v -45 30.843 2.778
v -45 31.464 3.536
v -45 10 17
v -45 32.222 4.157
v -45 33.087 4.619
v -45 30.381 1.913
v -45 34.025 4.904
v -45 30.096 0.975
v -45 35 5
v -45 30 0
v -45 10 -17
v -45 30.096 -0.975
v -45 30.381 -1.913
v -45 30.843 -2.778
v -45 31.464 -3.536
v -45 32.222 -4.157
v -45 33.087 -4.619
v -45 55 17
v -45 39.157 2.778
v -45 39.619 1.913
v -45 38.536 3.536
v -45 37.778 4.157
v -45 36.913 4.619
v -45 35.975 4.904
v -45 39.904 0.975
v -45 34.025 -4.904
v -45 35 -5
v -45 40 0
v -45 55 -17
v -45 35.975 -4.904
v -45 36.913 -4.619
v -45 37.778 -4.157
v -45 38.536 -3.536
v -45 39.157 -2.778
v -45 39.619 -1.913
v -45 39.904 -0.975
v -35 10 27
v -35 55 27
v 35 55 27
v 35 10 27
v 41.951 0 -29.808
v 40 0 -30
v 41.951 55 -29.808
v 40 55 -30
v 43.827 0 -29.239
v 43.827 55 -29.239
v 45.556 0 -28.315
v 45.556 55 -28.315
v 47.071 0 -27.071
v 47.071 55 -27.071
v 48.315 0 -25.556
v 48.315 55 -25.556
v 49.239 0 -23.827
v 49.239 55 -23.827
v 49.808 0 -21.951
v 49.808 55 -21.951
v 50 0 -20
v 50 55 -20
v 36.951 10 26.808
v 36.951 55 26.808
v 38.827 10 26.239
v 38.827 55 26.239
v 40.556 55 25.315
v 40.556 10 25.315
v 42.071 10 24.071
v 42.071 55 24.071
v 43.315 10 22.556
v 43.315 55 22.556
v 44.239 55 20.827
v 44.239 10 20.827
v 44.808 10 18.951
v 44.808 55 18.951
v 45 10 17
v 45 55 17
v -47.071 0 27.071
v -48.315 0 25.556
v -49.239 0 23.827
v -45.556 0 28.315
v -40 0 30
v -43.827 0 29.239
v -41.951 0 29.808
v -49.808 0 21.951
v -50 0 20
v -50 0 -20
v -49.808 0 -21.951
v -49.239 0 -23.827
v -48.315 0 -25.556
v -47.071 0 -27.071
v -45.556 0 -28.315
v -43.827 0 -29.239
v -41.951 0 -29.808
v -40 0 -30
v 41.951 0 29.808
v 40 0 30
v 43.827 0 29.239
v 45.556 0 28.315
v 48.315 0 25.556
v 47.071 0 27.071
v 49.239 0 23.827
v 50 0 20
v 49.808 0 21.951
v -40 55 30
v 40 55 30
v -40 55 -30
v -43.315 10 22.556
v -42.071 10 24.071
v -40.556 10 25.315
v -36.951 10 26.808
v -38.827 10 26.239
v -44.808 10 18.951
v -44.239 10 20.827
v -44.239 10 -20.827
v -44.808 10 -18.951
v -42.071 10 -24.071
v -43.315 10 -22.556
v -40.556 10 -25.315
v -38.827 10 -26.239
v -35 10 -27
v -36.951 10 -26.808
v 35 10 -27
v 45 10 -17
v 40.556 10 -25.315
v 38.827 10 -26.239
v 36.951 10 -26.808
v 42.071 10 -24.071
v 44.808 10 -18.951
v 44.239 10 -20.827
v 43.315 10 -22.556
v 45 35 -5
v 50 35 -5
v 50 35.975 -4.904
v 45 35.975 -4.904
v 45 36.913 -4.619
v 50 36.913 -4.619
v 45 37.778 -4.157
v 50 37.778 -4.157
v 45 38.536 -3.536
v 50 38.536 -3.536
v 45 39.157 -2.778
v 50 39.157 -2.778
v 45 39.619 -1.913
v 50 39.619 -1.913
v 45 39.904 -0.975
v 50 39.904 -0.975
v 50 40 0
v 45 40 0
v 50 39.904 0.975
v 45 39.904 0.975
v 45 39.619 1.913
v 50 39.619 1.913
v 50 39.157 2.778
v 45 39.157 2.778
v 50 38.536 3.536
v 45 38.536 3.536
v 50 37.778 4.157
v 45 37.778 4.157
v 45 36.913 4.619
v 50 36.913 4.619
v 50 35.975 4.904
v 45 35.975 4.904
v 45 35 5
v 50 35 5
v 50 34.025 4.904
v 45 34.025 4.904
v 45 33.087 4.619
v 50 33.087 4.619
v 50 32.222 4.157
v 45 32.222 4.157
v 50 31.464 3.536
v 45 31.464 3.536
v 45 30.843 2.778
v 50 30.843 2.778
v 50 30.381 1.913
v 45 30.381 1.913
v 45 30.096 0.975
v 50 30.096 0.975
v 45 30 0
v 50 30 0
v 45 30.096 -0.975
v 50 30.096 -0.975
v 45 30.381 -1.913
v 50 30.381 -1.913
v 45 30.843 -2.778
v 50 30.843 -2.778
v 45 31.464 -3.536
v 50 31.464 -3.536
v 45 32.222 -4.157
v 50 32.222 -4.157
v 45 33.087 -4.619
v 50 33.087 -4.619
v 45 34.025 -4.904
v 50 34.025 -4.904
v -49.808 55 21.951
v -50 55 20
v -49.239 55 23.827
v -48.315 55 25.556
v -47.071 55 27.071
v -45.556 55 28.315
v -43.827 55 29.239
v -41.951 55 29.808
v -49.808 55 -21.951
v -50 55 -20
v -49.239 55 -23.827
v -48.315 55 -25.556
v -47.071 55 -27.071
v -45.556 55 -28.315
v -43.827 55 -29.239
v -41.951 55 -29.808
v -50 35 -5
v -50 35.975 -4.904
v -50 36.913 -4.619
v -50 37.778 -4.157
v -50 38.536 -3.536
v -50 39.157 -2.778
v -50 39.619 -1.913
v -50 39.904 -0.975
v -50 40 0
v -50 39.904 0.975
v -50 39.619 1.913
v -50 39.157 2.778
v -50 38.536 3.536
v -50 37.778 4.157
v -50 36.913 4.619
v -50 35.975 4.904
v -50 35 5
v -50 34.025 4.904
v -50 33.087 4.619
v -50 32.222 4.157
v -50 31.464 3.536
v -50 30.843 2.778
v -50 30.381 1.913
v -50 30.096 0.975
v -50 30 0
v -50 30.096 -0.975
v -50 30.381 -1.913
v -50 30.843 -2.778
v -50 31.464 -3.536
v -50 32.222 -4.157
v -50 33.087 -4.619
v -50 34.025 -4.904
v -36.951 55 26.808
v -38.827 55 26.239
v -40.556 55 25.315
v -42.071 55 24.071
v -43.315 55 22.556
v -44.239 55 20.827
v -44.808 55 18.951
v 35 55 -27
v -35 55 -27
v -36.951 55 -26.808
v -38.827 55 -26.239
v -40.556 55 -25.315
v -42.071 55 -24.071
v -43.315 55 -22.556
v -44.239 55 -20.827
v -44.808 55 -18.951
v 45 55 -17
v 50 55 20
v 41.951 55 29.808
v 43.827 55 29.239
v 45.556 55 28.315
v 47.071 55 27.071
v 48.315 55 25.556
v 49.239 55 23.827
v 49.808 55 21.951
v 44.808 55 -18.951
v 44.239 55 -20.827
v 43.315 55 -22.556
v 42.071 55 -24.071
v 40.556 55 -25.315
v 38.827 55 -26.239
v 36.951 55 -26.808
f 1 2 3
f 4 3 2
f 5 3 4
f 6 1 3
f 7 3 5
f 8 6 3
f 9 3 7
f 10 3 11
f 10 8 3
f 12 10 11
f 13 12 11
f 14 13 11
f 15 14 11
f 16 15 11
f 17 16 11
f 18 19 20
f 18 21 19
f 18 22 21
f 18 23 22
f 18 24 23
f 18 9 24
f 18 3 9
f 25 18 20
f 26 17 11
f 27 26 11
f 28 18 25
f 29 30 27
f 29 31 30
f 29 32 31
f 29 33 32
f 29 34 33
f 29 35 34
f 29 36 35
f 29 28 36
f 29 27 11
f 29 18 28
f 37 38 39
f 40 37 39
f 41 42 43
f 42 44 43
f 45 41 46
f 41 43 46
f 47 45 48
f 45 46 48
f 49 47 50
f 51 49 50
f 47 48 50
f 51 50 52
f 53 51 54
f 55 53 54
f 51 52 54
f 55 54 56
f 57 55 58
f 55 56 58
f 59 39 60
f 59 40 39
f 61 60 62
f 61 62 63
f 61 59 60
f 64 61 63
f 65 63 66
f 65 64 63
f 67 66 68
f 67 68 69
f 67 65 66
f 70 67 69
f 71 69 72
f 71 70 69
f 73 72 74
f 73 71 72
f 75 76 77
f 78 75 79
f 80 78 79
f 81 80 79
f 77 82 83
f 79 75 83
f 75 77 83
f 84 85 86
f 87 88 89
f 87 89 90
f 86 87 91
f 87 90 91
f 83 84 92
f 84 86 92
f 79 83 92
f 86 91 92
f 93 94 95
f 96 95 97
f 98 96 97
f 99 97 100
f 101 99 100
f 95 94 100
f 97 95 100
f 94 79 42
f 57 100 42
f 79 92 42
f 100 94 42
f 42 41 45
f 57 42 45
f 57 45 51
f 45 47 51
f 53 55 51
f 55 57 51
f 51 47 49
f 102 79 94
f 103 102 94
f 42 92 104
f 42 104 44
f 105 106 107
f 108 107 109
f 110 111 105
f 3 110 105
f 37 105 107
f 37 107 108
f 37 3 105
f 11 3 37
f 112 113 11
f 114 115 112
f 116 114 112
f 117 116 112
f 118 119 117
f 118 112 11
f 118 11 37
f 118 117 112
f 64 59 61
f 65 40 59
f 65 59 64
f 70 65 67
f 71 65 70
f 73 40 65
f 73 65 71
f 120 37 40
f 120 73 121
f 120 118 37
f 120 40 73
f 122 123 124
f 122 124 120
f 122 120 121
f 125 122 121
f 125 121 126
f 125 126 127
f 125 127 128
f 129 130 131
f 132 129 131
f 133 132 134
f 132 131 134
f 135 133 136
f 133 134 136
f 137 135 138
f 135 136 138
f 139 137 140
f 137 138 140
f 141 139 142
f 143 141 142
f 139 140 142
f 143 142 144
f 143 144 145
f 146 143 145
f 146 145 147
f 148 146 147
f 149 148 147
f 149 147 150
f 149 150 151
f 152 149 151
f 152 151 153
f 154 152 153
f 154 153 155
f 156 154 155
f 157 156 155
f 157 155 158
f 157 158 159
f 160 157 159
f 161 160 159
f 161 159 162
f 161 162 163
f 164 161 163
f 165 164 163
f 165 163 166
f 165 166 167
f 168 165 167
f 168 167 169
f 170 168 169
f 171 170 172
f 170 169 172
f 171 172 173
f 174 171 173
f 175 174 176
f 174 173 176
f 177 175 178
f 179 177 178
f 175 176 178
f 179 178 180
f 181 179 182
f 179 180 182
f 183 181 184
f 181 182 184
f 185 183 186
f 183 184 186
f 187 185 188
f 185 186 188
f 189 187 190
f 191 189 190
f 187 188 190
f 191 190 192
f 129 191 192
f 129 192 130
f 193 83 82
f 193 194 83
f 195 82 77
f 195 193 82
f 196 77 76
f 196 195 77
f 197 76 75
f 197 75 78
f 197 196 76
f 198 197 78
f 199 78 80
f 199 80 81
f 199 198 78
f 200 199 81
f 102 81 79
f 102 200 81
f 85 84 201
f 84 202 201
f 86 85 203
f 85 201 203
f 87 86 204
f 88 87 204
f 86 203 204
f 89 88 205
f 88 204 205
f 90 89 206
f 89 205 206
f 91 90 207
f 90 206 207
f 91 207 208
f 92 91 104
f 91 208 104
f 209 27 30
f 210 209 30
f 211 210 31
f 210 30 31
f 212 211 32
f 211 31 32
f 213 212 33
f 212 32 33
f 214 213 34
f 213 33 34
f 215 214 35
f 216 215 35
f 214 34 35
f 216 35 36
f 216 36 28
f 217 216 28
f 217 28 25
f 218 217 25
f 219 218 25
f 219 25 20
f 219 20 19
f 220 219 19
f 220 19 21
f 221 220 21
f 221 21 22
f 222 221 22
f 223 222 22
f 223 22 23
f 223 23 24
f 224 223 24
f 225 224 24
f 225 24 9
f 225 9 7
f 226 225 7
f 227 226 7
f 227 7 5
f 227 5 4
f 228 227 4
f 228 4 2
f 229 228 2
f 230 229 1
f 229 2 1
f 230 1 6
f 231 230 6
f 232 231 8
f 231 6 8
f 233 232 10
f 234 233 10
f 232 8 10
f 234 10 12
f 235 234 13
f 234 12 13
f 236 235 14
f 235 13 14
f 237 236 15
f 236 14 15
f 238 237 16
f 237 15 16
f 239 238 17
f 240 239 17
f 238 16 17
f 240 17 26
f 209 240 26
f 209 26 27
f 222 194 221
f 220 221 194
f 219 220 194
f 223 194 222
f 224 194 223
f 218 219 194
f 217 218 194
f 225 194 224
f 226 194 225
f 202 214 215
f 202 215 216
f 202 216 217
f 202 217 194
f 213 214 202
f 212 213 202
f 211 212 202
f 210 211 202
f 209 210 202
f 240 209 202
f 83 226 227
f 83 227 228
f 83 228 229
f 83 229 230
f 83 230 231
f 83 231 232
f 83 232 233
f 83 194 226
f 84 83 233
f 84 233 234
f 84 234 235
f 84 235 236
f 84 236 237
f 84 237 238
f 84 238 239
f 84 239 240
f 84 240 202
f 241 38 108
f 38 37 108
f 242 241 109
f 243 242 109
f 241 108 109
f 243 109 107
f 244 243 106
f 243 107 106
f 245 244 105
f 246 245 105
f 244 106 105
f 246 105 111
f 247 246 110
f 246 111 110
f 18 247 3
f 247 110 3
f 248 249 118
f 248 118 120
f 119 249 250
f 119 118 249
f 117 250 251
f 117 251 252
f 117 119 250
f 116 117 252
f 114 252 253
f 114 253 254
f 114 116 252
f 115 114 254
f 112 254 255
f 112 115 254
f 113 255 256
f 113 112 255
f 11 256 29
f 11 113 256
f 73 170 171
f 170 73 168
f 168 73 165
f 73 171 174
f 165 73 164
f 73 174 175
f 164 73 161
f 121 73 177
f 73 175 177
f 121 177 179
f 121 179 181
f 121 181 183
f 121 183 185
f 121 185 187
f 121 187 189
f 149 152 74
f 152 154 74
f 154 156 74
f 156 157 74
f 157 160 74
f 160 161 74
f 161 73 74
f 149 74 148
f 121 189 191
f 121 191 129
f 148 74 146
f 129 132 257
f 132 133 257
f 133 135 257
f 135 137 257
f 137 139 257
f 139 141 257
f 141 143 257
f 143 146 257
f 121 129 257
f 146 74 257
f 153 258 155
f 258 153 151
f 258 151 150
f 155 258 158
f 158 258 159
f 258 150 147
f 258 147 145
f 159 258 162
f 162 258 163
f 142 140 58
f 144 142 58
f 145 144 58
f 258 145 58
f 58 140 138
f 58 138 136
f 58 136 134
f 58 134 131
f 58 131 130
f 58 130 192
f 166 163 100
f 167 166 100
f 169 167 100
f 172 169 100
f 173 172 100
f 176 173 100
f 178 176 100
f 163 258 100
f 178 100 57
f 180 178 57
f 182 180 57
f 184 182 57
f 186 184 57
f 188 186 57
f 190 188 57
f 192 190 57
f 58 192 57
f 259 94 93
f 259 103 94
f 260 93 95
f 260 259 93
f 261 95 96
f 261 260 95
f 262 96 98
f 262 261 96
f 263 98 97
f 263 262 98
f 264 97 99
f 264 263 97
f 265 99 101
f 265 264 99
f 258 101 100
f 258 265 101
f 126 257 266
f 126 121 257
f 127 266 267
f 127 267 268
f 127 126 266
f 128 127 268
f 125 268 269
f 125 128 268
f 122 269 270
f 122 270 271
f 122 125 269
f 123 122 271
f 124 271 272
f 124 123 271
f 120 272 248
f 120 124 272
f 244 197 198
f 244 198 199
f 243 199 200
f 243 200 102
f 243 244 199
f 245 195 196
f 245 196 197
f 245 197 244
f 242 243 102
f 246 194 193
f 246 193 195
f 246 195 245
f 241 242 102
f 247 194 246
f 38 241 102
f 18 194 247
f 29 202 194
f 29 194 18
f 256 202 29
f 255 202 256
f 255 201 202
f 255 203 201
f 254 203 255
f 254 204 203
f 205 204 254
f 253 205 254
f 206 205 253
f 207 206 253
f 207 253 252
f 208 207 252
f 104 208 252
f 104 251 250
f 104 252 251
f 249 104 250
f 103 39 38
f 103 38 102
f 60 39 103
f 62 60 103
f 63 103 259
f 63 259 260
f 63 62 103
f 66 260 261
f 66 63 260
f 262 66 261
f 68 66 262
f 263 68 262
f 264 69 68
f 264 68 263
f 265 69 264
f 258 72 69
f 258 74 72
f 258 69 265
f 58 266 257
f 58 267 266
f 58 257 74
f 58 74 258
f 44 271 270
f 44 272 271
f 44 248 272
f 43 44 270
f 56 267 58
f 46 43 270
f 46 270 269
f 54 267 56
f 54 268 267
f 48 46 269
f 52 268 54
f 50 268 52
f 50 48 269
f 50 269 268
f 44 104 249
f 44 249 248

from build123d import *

# Parameters (mm, degrees)
ESBO_O3_W                = 100
ESBO_O3_H                = 60
RESSALTO_EXTRUS_O1_DEPTH = 55
ESBO_O4_W                = 90
ESBO_O4_H                = 54
CORTE_EXTRUS_O1_DEPTH    = 45
ESBO_O5_R                = 5
CORTE_EXTRUS_O2_DEPTH    = 100
FILETE1_R                = 10


with BuildPart() as part:
    # Esboço3 → Ressalto-extrusão1 (new body)
    with BuildSketch(Plane(origin=(0, 0, 0), x_dir=(1, 0, 0), z_dir=(0, 1, 0))):
        Rectangle(ESBO_O3_W, ESBO_O3_H)
    extrude(amount=RESSALTO_EXTRUS_O1_DEPTH)

    # Esboço4 → Corte-extrusão1 (cut)
    with BuildSketch(Plane(origin=(0, 55, 0), x_dir=(1, 0, 0), z_dir=(0, 1, 0))):
        Rectangle(ESBO_O4_W, ESBO_O4_H)
    extrude(amount=-CORTE_EXTRUS_O1_DEPTH, mode=Mode.SUBTRACT)

    # Esboço5 → Corte-extrusão2 (cut)
    with BuildSketch(Plane(origin=(50, 0, 0), x_dir=(0, 0, -1), z_dir=(1, 0, 0))):
        with Locations((0, 35)):
            Circle(ESBO_O5_R)
    extrude(amount=-CORTE_EXTRUS_O2_DEPTH, mode=Mode.SUBTRACT)

    # Filete1
    filete1_edges = [part.edges().sort_by_distance(p)[0] for p in [
        (-45, 32.5, 27),
        (-45, 32.5, -27),
        (45, 32.5, -27),
        (45, 32.5, 27),
        (-50, 27.5, -30),
        (50, 27.5, -30),
        (50, 27.5, 30),
        (-50, 27.5, 30),
    ]]
    fillet(filete1_edges, radius=FILETE1_R)


solid = part.part
